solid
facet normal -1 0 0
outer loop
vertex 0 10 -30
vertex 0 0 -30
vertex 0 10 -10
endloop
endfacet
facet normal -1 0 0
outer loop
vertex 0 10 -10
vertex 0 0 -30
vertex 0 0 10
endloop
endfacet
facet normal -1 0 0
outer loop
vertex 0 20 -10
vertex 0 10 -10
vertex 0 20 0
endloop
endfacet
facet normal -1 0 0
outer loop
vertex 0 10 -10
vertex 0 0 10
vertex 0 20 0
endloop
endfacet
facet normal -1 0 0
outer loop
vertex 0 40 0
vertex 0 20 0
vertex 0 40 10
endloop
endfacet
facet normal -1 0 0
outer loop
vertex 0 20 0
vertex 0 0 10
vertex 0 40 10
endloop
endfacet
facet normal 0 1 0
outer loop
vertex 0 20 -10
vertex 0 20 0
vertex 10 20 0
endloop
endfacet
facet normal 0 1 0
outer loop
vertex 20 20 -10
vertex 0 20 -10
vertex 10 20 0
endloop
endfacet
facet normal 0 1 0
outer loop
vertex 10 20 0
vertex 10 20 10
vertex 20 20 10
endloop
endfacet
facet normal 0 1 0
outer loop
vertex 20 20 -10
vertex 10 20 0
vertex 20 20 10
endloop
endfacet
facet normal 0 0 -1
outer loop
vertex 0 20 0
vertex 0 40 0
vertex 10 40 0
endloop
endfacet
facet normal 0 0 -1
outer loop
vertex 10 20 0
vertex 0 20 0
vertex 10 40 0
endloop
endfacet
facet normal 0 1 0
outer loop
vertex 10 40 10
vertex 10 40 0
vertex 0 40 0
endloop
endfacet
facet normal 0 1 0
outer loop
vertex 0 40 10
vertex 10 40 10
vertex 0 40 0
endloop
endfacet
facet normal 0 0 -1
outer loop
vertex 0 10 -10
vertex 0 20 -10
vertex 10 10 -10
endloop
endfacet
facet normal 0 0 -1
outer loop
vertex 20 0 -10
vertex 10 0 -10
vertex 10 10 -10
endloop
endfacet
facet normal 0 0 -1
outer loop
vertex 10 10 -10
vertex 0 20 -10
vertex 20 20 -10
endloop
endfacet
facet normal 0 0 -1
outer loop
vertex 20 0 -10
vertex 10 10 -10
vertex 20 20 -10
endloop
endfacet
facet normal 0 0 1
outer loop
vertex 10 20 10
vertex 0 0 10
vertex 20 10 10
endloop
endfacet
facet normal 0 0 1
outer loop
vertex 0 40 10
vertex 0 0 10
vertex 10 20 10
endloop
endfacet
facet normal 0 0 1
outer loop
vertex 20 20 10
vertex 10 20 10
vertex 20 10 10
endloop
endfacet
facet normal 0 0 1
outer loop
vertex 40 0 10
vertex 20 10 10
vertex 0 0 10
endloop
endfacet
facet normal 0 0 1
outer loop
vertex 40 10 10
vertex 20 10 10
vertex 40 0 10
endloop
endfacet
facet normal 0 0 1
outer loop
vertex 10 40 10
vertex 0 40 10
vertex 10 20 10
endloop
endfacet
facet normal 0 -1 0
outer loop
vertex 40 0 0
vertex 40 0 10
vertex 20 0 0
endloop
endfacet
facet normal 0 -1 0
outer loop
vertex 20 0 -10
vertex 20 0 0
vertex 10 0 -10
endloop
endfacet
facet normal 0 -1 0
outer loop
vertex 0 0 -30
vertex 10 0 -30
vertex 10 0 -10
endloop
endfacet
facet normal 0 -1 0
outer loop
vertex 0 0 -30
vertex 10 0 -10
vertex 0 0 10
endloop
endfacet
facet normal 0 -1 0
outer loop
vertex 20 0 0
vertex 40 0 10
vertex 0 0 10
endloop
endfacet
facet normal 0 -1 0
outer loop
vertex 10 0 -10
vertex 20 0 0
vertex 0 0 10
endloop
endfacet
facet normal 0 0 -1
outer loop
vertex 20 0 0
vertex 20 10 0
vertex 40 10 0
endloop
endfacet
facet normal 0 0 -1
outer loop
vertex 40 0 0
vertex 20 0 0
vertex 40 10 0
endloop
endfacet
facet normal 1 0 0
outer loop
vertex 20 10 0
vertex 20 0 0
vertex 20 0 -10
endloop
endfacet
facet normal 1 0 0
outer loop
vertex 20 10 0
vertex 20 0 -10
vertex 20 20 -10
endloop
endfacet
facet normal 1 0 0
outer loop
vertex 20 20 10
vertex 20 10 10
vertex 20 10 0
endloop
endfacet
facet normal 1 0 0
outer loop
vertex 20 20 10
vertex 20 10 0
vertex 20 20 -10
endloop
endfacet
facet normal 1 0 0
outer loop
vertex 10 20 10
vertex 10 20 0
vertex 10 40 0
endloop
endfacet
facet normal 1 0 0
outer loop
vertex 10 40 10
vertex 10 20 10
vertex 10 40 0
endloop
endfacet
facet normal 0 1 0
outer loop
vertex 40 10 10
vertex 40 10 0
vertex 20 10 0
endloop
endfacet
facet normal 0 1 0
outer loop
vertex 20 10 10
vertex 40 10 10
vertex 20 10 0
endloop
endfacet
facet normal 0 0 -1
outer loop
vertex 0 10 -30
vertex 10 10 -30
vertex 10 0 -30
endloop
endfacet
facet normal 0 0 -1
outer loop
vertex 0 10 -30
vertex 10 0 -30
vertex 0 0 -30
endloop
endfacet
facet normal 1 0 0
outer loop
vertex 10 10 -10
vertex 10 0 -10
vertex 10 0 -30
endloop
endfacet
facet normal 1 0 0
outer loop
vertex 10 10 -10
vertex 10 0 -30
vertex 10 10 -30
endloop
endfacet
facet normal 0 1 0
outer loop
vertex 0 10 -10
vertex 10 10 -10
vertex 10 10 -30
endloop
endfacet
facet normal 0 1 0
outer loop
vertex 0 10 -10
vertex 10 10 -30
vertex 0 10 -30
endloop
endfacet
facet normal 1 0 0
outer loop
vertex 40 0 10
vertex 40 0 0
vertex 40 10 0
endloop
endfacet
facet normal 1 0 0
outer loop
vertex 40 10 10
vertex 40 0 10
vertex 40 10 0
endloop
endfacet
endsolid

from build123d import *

# Parameters (mm, degrees)
BOSS_EXTRUDE1_DEPTH = 10
SKETCH2_W           = 10
SKETCH2_H           = 10
BOSS_EXTRUDE2_DEPTH = 30
SKETCH3_W           = 20
SKETCH3_H           = 20
BOSS_EXTRUDE3_DEPTH = 20


with BuildPart() as part:
    # Sketch1 → Boss-Extrude1 (new body)
    with BuildSketch(Plane.XY):
        Polygon((0, 0), (10, 0), (40, 0), (40, 10), (10, 10), (10, 40), (0, 40), align=None)
    extrude(amount=BOSS_EXTRUDE1_DEPTH)

    # Sketch2 → Boss-Extrude2 (add)
    with BuildSketch(Plane(origin=(0, 0, 0), x_dir=(-1, 0, 0), z_dir=(0, 0, -1))):
        with Locations((-5, 5)):
            Rectangle(SKETCH2_W, SKETCH2_H)
    extrude(amount=BOSS_EXTRUDE2_DEPTH)

    # Sketch3 → Boss-Extrude3 (add)
    with BuildSketch(Plane.XY.offset(10)):
        with Locations((10, 10)):
            Rectangle(SKETCH3_W, SKETCH3_H)
    extrude(amount=-BOSS_EXTRUDE3_DEPTH)


solid = part.part
